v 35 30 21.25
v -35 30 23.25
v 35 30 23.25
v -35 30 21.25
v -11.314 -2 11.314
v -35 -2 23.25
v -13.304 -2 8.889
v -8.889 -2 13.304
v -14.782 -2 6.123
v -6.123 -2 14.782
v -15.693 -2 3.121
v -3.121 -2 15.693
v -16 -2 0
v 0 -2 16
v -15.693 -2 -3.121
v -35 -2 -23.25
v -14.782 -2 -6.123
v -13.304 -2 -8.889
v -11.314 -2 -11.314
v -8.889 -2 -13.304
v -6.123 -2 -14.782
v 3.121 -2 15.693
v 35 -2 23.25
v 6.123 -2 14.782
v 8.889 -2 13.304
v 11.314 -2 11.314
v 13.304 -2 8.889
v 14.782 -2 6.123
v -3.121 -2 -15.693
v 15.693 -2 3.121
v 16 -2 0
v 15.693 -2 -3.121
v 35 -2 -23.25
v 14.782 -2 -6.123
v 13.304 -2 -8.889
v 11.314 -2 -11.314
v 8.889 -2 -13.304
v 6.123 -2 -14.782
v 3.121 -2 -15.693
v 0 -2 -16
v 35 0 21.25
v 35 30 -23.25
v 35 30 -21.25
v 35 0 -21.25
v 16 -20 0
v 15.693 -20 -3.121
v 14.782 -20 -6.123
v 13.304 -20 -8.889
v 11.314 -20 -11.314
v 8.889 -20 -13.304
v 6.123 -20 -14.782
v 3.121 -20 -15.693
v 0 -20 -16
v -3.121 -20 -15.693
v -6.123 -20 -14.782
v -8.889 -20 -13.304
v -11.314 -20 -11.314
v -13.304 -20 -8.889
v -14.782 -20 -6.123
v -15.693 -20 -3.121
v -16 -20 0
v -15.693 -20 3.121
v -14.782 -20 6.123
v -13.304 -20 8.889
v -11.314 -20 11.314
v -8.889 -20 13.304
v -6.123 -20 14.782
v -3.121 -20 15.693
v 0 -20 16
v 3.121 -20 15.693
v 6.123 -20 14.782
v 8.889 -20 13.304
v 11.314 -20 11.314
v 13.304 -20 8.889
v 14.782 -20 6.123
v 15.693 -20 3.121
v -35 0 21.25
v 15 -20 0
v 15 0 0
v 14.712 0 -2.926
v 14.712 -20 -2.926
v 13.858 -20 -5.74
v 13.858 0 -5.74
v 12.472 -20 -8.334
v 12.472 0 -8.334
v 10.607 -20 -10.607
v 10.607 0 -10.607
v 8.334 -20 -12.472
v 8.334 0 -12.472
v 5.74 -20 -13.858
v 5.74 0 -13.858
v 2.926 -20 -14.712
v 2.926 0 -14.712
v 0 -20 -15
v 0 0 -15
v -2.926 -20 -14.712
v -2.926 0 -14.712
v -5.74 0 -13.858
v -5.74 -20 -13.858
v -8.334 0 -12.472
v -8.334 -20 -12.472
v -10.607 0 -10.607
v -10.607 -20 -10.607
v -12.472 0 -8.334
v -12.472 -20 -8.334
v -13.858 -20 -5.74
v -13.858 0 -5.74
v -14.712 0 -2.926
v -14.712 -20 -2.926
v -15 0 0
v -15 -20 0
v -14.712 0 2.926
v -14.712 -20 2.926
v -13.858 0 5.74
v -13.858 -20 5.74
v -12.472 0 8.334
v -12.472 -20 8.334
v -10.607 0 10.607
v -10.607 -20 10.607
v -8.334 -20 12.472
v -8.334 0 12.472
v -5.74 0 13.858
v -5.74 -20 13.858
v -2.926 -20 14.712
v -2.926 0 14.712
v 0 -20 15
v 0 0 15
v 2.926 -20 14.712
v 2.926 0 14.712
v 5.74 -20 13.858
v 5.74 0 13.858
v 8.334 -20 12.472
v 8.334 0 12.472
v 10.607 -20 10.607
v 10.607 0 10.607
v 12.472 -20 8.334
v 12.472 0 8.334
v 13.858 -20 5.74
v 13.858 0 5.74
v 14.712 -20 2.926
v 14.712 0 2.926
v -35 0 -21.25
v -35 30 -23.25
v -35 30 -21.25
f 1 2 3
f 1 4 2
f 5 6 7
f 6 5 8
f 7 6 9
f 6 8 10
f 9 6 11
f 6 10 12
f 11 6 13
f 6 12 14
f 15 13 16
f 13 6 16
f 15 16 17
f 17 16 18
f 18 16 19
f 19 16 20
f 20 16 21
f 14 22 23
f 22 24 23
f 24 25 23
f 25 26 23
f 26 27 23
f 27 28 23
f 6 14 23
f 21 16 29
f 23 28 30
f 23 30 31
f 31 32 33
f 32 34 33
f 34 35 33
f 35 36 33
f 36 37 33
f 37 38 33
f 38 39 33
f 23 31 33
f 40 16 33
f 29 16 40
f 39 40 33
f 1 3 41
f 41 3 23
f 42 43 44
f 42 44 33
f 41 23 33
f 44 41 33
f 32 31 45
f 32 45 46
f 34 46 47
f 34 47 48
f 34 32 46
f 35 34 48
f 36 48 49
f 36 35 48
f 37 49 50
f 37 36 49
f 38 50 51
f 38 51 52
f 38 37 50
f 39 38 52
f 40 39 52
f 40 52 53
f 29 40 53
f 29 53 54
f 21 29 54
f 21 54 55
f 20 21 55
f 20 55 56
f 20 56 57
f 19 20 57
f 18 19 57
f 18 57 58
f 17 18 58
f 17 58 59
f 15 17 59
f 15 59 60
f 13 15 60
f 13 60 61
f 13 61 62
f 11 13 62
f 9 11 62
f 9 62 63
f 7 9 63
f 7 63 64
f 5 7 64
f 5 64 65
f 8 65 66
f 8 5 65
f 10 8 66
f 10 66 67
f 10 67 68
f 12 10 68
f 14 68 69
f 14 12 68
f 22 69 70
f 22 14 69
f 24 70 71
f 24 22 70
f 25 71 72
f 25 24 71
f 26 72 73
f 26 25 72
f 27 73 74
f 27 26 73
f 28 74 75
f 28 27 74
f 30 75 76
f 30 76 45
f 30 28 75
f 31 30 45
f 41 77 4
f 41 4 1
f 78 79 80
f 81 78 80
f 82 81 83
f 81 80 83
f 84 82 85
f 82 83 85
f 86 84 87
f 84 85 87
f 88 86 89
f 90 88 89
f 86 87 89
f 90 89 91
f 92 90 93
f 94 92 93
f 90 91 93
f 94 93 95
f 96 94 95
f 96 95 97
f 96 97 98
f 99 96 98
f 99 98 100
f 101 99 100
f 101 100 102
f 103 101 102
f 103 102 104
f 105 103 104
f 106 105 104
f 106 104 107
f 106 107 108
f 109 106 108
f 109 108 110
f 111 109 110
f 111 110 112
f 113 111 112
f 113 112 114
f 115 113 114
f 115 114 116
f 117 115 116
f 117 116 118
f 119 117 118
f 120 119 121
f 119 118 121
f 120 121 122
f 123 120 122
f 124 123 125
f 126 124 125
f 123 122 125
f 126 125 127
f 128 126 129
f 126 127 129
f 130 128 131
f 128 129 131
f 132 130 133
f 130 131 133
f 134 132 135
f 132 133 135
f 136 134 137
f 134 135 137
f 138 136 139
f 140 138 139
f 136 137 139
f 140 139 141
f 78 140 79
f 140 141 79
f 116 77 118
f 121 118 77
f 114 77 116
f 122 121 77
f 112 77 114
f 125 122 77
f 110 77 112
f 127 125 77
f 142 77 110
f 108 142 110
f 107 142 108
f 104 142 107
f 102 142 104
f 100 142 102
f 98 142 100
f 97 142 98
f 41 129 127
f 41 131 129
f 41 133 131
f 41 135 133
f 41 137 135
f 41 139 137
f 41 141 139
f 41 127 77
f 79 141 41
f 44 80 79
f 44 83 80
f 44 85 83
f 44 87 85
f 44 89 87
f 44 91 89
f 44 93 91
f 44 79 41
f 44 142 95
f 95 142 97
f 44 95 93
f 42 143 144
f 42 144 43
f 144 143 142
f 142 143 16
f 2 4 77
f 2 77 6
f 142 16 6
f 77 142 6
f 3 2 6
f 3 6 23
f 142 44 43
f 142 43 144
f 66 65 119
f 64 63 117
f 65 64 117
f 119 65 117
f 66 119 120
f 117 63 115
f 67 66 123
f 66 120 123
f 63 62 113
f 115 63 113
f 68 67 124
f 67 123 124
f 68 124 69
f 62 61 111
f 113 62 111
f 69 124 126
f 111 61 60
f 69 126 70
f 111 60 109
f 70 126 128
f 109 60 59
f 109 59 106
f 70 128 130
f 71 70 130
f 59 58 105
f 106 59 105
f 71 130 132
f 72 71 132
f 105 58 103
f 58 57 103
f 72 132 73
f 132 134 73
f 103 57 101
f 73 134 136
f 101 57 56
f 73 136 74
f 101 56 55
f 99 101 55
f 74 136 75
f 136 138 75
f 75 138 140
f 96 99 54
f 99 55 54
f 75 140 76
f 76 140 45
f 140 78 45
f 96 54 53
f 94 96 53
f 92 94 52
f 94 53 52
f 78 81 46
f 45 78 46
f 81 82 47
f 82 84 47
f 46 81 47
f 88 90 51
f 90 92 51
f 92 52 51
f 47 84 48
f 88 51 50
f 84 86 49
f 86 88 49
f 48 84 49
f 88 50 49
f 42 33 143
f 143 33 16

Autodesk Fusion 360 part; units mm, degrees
sketch "Sketch1" plane through (0, 0, 0) normal (0, 1, 0) x (1, 0, 0)
  circle A0 centre (0, 0) radius 15
  line L0 (35, 21.25) -> (-35, 21.25)
  line L1 (-35, 21.25) -> (-35, -21.25)
  line L2 (-35, -21.25) -> (35, -21.25)
  line L3 (35, -21.25) -> (35, 21.25)
  line L4 (35, 21.25) -> (-35, -21.25) construction
  line L5 (-35, 21.25) -> (35, -21.25) construction
  line L6 (35, 23.25) -> (-35, 23.25)
  line L7 (-35, 23.25) -> (-35, -23.25)
  line L8 (-35, -23.25) -> (35, -23.25)
  line L9 (35, -23.25) -> (35, 23.25)
  line L10 (35, 23.25) -> (-35, -23.25) construction
  line L11 (-35, 23.25) -> (35, -23.25) construction
  circle A1 centre (0, 0) radius 16
  dimension "d1" = 30
  dimension "d2" = 70
  dimension "d3" = 42.5
  dimension "d4" = 70
  dimension "d5" = 46.5
  dimension "d6" = 32
extrude "Extrude1" add sketch "Sketch1" against normal blind 20 contours A1 makes body 1
extrude "Extrude2" add sketch "Sketch1" against normal blind 2 contours L0 L1 L2 L3 L7 L9 bodies 1
extrude "Extrude3" add sketch "Sketch1" along normal blind 30 separate body contours L0 L6 L7 L9 | L2 L7 L8 L9 makes body 2 at (11.6667, 10, -21.25) makes body 3 at (-11.6667, 10, 23.25)
extrude "Extrude4" add sketch "Sketch1" against normal blind 2 contours L0 L6 L7 L9 | L2 L7 L8 L9 bodies 1 2 3
equation "d4 = d2"
equation "d5 = d3 + 4 mm"
equation "d6 = d1 + 2 mm"
